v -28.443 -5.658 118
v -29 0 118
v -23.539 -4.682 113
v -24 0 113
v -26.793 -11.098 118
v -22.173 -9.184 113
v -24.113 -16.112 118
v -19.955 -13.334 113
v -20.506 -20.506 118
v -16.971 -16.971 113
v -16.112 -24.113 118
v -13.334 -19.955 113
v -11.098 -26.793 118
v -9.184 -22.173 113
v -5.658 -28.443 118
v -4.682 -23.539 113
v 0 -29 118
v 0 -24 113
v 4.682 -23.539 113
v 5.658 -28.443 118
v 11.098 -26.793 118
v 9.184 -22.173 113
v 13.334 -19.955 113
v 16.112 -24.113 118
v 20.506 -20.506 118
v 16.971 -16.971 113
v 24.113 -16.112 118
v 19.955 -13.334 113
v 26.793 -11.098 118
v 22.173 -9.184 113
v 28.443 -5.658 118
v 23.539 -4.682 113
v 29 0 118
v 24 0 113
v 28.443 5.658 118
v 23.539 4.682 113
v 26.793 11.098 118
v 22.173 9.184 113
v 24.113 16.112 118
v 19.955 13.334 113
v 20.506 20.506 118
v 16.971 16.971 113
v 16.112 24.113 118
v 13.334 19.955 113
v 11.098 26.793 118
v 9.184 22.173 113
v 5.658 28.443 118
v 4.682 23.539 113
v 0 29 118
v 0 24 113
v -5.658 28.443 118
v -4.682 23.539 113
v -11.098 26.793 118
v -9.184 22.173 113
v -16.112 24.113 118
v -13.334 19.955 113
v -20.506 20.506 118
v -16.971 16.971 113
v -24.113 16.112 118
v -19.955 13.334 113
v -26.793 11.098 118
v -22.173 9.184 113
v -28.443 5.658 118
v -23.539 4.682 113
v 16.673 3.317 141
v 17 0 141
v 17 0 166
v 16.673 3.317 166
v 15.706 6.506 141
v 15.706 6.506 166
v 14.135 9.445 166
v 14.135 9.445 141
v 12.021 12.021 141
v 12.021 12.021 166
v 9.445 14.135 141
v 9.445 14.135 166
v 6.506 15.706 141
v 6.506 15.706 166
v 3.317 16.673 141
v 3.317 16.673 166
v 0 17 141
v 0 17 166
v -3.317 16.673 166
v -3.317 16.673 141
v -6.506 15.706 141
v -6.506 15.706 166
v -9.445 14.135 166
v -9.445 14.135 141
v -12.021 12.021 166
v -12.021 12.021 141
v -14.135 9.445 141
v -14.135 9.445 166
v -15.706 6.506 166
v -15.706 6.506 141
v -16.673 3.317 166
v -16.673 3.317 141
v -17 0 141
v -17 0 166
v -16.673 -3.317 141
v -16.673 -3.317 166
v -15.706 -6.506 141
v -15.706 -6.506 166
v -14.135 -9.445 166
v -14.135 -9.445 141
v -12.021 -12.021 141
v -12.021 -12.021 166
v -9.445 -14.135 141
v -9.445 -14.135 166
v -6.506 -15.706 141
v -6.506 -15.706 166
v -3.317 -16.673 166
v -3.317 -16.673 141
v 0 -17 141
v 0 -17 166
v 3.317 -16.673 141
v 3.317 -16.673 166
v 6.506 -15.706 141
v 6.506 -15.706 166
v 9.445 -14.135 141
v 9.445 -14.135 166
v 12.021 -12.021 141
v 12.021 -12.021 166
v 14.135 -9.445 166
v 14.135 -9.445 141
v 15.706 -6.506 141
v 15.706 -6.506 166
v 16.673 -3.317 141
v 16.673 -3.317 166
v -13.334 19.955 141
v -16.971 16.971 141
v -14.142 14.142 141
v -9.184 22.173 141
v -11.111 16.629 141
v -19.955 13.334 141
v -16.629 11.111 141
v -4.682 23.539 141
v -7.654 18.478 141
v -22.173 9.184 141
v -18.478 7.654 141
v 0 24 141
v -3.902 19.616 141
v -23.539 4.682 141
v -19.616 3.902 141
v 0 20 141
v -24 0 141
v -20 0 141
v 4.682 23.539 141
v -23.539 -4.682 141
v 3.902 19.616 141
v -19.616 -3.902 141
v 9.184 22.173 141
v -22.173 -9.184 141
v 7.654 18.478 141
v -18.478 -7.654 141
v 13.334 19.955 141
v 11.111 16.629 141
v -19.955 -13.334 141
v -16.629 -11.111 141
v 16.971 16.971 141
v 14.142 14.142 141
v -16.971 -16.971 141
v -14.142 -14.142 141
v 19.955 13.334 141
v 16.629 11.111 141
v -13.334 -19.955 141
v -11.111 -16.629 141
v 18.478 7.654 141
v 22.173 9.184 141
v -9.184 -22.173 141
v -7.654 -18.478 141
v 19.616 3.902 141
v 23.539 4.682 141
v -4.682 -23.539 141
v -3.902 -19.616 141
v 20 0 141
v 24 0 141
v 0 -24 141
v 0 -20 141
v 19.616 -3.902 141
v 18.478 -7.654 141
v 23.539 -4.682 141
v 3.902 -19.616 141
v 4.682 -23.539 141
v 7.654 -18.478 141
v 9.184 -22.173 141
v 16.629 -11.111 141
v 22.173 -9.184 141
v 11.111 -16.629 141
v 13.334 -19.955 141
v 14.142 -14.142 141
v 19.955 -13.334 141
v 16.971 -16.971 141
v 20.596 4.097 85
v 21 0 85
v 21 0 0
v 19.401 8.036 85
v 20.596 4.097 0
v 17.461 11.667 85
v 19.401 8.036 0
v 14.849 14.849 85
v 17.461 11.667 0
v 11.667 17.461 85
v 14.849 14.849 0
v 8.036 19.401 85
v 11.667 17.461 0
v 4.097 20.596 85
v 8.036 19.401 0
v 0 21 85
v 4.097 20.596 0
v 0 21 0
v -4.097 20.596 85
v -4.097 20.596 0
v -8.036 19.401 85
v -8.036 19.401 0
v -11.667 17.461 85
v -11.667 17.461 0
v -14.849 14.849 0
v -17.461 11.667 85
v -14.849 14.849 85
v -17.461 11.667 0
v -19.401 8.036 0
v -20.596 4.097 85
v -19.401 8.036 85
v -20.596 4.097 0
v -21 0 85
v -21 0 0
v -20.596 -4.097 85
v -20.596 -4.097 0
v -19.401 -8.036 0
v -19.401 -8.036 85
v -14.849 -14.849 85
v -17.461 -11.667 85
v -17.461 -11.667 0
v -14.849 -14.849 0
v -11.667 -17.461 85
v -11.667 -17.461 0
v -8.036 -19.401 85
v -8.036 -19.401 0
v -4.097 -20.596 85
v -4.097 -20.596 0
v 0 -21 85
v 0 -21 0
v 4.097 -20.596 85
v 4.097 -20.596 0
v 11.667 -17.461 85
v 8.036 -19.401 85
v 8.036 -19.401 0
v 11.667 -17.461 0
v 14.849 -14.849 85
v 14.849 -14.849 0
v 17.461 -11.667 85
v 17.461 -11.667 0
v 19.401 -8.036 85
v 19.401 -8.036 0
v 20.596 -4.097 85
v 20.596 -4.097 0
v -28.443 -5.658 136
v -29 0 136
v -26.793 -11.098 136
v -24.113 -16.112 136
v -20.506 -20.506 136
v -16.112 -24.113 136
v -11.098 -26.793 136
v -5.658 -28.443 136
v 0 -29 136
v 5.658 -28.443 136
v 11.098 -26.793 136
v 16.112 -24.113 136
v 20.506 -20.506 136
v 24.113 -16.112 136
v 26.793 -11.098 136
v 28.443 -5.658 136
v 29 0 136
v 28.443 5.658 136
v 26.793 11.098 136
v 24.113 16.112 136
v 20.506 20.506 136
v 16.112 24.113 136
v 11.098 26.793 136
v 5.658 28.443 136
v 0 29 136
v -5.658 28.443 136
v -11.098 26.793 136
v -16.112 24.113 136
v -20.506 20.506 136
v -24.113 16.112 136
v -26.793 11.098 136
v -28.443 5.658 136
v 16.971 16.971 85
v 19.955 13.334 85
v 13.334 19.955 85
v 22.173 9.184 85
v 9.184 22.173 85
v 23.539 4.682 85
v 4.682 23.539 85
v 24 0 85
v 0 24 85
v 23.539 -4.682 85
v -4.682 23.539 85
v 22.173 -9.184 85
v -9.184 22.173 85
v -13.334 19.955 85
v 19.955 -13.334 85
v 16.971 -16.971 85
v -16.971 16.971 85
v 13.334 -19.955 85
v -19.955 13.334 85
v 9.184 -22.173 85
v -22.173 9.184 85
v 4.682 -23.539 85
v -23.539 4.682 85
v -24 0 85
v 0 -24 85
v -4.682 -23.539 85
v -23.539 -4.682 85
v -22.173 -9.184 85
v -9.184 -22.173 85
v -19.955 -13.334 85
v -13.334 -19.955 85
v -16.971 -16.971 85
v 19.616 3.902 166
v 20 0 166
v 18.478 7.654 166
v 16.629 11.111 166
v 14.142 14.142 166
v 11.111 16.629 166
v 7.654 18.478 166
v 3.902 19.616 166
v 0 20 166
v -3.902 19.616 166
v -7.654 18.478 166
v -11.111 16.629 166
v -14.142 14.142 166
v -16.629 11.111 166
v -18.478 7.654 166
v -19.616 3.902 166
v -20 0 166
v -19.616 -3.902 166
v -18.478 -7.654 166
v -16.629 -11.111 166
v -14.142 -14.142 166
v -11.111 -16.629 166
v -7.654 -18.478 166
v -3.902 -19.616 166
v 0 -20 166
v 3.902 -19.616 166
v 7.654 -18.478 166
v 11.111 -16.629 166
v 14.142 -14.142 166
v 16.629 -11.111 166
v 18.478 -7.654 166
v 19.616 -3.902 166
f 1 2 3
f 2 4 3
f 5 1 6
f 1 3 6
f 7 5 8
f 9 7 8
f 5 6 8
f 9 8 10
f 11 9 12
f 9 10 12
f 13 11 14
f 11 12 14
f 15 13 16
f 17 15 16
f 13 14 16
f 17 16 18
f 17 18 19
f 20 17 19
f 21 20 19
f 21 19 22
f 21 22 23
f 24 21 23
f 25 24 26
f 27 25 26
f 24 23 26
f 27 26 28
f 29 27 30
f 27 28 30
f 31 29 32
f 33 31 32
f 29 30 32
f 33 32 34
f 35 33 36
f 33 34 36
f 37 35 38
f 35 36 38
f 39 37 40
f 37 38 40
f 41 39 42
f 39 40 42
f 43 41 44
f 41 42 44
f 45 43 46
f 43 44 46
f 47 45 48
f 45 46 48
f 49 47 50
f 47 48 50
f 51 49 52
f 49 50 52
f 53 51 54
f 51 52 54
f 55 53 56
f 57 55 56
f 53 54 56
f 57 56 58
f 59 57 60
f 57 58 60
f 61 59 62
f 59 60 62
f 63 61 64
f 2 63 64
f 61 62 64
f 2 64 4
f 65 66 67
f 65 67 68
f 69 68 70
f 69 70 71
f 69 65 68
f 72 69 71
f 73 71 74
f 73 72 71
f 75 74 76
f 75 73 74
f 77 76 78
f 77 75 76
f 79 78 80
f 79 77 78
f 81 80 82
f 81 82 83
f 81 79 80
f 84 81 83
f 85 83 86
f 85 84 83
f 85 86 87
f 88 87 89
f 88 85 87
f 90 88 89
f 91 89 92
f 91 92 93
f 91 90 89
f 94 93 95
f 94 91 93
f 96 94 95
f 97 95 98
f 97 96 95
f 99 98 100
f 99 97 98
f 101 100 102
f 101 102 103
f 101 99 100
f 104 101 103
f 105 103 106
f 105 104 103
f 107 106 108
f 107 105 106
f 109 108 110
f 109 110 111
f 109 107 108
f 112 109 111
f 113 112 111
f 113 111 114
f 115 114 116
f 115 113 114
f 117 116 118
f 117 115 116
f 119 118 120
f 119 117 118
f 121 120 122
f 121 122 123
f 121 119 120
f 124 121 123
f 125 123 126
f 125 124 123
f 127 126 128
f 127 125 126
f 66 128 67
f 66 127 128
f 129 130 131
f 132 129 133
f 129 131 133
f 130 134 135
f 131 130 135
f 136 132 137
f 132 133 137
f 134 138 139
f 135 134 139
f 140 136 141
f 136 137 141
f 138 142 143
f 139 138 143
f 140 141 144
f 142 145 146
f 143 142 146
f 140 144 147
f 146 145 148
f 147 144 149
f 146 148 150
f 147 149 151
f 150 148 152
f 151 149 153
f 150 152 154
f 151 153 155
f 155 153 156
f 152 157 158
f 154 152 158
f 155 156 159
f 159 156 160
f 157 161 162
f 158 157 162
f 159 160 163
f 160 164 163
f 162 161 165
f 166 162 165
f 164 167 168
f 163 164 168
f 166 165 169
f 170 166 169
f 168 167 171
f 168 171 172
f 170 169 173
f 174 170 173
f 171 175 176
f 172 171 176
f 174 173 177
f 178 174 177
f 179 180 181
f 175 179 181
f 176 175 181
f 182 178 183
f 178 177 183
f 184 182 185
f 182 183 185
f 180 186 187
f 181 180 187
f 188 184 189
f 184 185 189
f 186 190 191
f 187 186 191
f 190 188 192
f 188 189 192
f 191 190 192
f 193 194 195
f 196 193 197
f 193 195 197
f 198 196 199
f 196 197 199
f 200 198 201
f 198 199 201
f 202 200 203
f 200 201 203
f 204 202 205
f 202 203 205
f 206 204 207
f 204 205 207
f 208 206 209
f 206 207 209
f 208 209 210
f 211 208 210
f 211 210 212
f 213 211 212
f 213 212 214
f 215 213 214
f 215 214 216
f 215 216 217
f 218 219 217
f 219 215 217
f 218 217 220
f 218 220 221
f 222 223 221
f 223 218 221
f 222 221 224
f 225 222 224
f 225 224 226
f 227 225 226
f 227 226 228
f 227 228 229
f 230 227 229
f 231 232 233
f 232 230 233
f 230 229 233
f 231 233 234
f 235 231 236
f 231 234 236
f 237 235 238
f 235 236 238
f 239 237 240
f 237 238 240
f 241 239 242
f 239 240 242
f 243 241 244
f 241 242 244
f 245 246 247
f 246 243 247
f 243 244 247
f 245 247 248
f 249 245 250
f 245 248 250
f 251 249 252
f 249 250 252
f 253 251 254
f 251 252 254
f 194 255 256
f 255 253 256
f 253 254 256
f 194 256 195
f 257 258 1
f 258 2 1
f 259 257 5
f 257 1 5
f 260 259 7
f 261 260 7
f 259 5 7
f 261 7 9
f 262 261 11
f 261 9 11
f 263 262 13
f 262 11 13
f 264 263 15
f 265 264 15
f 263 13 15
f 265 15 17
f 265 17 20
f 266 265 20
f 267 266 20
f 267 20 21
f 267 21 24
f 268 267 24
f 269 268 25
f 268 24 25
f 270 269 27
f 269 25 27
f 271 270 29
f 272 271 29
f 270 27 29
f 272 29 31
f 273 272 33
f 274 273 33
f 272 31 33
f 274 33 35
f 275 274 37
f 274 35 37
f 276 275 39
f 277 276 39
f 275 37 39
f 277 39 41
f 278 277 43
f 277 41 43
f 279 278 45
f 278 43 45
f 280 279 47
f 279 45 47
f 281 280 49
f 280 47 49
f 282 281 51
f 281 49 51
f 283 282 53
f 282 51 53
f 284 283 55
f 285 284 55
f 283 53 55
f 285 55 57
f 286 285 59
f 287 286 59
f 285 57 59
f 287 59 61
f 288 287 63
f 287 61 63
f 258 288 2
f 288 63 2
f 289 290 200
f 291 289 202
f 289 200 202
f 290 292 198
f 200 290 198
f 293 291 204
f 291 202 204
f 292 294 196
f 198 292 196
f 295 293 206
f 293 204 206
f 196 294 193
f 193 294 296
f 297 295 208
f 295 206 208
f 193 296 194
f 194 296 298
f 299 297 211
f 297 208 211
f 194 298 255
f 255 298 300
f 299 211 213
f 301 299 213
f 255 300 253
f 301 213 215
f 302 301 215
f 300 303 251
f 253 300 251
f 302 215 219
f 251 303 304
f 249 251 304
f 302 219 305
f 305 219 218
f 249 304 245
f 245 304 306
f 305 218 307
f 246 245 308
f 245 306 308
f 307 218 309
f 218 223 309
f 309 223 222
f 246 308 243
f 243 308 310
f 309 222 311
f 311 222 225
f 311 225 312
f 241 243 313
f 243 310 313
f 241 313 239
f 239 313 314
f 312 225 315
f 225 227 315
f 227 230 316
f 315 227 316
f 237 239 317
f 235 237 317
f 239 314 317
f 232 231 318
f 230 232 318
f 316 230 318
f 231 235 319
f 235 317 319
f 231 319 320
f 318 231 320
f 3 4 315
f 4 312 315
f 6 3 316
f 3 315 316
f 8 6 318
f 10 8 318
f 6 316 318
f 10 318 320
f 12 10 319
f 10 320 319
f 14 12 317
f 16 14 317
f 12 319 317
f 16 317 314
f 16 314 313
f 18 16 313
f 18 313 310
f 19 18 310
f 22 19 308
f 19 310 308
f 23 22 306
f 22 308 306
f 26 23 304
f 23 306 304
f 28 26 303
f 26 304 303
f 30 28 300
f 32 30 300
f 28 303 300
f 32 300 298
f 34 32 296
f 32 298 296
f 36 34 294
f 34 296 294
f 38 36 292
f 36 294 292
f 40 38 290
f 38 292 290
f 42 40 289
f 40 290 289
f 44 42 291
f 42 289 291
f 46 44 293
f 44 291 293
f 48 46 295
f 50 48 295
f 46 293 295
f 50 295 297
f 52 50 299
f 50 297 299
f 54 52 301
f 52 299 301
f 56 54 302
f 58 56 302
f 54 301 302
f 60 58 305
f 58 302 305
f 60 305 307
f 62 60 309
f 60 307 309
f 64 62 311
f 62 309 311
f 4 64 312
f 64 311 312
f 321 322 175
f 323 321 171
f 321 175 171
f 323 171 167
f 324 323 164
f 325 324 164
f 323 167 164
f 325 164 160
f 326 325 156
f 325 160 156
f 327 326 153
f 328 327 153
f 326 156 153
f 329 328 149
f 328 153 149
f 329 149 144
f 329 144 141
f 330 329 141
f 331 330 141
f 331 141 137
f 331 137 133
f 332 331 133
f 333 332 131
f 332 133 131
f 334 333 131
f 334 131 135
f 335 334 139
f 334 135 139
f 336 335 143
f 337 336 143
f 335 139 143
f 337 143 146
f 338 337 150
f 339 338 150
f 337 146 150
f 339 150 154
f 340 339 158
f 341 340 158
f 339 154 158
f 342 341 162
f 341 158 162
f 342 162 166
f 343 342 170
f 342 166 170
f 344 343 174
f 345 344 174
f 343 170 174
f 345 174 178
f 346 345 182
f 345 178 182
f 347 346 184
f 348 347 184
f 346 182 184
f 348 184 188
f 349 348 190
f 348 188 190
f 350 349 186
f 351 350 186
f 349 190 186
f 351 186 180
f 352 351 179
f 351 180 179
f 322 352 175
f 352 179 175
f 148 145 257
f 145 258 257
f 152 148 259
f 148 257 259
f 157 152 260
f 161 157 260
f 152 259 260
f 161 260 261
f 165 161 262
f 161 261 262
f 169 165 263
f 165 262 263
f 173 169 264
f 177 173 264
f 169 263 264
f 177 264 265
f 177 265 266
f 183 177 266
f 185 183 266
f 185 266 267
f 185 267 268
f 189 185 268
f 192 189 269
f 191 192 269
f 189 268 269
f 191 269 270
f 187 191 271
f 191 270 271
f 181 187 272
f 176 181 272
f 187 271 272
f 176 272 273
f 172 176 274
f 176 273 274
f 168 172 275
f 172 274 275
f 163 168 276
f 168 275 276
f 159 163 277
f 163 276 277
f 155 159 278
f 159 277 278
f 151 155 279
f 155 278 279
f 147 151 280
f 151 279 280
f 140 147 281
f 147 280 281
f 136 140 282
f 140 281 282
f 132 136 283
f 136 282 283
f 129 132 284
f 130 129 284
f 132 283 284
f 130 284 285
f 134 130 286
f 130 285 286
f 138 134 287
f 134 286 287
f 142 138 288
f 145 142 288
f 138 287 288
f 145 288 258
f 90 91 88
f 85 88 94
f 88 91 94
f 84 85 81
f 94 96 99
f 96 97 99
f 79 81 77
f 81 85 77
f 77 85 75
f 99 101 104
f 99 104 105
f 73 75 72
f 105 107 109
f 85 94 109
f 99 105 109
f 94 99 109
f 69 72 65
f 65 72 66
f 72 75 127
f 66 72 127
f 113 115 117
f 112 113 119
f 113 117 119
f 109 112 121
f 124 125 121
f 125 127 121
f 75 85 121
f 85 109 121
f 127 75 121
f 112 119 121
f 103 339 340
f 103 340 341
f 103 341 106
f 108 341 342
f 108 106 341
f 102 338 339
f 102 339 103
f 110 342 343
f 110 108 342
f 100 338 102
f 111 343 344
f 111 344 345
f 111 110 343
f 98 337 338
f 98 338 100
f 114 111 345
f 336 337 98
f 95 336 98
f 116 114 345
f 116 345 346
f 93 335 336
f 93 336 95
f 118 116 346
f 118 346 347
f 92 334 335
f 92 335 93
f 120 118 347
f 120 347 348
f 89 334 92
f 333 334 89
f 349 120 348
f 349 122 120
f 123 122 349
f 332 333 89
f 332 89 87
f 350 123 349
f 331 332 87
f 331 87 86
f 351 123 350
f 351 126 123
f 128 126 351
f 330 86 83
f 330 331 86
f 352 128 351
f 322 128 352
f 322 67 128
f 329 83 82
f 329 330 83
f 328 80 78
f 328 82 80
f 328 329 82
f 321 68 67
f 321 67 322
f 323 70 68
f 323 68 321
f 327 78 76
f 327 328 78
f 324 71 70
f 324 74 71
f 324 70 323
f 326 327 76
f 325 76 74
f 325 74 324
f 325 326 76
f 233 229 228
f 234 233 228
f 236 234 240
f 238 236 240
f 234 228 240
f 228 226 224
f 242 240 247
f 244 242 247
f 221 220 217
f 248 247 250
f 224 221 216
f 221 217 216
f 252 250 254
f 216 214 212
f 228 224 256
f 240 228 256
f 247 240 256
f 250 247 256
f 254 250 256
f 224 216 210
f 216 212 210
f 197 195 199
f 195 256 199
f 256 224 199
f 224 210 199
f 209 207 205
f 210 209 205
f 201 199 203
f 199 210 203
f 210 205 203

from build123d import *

# Parameters (mm, degrees)
F0_R     = 21
F1_DEPTH = 100
F4_R     = 20
F4_R_2   = 17
F5_DEPTH = 25


with BuildPart() as f1:
    # F0 (on Top) → F1 (new body)
    with BuildSketch(Plane.XY):
        Circle(F0_R)
    extrude(amount=F1_DEPTH)

    # F2 (on Front) → F3 (revolve)
    with BuildSketch(Plane.XZ):
        Polygon((-24, 85), (0, 85), (0, 141), (-24, 141), (-29, 136), (-29, 118), (-24, 113), align=None)
    revolve(axis=Axis((0, 0, 74.559175), (0, 0, 1)))

    # F4 (on face) → F5 (join)
    with BuildSketch(Plane.XY.offset(141)):
        Circle(F4_R)
        Circle(F4_R_2, mode=Mode.SUBTRACT)
    extrude(amount=F5_DEPTH)


solid = f1.part
